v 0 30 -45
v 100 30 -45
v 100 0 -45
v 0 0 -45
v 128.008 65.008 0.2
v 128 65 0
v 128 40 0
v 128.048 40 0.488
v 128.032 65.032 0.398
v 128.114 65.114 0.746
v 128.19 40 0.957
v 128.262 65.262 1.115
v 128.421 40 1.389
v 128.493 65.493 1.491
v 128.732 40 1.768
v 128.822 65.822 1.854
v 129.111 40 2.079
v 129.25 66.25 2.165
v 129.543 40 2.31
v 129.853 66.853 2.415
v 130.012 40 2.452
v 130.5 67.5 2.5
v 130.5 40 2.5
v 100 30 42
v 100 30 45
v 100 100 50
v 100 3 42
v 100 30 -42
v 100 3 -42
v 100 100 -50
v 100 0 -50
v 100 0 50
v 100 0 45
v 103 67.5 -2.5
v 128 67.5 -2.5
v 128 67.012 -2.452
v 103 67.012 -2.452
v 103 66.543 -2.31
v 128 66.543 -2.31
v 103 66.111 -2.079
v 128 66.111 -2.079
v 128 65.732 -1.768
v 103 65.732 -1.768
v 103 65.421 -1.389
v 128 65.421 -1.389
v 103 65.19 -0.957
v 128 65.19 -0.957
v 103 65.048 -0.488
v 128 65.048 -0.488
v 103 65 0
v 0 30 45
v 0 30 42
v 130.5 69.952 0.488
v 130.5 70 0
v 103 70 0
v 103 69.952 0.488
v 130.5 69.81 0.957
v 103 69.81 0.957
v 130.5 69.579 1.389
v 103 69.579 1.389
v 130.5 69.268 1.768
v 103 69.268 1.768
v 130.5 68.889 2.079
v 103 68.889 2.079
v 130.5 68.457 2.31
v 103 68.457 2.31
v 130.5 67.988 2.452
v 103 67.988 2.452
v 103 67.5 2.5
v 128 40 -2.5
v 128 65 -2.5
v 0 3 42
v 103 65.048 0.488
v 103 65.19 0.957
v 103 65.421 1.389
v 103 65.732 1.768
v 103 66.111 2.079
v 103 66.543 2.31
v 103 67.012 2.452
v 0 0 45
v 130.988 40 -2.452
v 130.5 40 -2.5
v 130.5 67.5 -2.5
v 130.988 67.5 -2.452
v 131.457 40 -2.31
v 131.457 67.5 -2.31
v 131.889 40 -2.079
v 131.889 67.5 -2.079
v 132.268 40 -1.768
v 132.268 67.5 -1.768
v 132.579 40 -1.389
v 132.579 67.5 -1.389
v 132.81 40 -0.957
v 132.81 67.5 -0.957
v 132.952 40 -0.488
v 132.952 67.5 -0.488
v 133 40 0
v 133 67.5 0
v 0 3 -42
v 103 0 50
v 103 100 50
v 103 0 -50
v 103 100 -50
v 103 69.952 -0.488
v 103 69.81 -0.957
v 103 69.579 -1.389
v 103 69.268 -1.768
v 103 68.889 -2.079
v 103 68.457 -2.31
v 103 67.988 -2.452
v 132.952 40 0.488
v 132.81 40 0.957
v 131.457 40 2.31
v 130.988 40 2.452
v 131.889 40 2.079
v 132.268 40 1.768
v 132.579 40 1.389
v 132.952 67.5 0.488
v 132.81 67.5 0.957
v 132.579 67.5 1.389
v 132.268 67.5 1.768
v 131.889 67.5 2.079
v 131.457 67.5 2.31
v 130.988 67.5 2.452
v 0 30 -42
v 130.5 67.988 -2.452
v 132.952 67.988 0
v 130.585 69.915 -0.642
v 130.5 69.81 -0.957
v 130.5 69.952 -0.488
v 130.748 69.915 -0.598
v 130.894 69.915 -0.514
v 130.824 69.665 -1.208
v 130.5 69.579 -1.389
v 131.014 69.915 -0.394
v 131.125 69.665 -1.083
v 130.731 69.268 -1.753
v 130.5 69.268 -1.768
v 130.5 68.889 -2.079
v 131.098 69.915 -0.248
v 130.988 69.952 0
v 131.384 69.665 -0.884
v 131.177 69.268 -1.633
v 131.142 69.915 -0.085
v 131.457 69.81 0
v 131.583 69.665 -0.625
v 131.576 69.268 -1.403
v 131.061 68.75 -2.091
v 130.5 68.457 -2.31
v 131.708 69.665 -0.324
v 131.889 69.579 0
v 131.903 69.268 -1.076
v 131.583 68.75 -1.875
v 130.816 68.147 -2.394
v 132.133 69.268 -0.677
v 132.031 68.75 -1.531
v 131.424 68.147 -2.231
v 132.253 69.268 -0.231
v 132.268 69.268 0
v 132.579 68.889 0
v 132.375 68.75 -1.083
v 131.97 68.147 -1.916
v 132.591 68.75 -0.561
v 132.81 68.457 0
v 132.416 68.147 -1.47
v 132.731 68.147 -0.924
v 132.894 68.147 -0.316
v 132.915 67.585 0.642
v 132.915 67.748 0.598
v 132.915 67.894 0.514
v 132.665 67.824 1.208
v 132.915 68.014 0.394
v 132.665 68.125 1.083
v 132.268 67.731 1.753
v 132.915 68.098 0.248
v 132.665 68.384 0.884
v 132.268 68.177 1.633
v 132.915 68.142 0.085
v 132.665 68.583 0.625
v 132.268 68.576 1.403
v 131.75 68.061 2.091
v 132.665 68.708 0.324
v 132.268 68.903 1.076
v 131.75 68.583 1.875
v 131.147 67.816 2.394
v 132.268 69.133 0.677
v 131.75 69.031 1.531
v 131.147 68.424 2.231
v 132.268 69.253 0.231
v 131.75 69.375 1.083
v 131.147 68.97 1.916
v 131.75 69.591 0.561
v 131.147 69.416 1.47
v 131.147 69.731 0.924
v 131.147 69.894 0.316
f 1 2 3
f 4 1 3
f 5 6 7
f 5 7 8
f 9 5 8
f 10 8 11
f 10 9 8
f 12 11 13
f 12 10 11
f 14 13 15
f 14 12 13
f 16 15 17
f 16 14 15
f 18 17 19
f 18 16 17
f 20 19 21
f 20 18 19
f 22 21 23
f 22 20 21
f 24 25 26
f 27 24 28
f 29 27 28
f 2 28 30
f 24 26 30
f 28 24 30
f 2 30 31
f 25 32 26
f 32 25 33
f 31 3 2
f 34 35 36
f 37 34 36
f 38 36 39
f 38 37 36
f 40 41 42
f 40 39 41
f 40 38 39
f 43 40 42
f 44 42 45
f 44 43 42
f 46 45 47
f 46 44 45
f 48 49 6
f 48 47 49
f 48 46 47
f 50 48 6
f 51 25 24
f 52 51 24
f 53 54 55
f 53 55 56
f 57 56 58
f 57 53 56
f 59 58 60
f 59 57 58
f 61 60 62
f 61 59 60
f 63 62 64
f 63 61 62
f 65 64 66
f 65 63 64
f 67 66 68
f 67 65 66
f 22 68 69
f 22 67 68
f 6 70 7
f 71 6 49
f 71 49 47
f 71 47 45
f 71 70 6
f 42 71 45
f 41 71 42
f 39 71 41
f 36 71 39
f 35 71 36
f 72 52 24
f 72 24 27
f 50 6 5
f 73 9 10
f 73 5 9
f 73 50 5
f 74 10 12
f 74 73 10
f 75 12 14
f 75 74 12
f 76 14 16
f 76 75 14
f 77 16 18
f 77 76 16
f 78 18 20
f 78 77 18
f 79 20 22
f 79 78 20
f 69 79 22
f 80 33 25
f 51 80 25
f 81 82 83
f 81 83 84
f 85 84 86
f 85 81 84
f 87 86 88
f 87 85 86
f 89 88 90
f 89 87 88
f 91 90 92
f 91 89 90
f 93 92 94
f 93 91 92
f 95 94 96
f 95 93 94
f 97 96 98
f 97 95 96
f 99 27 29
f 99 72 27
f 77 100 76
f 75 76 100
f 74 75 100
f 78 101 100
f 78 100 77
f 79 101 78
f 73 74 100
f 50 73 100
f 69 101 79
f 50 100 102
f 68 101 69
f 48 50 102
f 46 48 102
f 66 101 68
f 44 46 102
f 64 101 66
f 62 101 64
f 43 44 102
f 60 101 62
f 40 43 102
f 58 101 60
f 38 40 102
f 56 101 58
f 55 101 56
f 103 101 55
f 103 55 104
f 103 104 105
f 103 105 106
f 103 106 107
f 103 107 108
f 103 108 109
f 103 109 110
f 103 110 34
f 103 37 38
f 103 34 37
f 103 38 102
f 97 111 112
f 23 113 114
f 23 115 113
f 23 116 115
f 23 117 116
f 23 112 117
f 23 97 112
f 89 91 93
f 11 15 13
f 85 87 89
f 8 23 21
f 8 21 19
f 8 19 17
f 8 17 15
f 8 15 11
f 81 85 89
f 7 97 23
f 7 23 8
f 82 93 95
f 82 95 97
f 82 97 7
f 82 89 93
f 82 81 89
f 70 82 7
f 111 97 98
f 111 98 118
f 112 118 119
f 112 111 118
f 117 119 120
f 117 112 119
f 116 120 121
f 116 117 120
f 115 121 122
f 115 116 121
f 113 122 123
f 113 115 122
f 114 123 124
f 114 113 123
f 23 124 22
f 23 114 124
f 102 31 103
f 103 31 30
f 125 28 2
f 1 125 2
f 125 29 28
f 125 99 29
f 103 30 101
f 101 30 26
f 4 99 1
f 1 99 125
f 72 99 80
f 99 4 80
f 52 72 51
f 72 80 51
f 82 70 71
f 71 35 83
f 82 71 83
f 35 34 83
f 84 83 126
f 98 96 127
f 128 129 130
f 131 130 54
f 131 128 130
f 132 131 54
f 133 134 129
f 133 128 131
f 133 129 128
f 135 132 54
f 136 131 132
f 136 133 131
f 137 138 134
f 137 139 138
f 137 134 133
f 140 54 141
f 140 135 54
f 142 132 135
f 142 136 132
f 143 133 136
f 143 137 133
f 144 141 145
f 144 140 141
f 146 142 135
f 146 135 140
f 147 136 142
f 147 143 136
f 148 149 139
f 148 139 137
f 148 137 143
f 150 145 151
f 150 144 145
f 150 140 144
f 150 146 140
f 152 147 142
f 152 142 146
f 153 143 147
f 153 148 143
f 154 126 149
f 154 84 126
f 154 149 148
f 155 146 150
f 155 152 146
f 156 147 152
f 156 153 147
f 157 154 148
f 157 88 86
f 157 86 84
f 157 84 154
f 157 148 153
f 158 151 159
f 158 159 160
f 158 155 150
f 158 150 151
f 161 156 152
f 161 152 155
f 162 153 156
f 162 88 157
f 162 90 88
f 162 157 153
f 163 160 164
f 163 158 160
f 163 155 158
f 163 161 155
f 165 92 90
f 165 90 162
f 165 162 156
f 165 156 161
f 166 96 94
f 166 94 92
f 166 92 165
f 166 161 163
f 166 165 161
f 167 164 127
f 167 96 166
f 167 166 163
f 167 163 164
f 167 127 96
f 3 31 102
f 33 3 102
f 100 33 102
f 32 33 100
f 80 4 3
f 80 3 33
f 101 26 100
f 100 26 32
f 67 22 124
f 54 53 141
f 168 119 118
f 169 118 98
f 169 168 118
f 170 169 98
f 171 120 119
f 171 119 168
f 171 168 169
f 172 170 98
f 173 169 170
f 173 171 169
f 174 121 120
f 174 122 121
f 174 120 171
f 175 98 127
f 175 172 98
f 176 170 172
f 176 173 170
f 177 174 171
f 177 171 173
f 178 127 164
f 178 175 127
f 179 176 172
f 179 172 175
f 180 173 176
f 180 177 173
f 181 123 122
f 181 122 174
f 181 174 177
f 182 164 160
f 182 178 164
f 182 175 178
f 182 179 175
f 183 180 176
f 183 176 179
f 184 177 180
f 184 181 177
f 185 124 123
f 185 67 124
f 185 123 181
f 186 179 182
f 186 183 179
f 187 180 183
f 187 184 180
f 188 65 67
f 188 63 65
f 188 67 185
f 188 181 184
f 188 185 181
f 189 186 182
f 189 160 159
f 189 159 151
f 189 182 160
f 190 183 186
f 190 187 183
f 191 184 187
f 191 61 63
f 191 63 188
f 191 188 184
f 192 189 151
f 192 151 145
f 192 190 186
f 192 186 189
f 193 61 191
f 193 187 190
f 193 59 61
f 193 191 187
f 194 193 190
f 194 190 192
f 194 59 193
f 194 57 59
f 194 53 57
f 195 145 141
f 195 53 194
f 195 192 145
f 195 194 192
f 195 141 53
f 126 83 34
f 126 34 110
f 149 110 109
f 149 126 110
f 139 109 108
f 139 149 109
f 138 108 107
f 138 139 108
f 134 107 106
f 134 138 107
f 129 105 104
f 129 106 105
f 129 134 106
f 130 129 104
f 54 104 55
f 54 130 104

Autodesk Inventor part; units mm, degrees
ref_plane "YZ Plane" through (0, 0, 0) normal (1, 0, 0) x (0, 1, 0)
ref_plane "XZ Plane" through (0, 0, 0) normal (0, 1, 0) x (-1, 0, 0)
ref_plane "XY Plane" through (0, 0, 0) normal (0, 0, 1) x (1, 0, 0)
sketch "Sketch1" plane through (0, 0, 0) normal (1, 0, 0) x (0, 1, 0)
  line L0 (0, 45) -> (30, 45)
  line L1 (30, 45) -> (30, -45)
  line L2 (30, -45) -> (0, -45)
  line L3 (0, -45) -> (0, 45)
  line L4 (30, 42) -> (3, 42)
  line L5 (3, 42) -> (3, -42)
  line L6 (3, -42) -> (30, -42)
  line L7 (30, -42) -> (30, 42)
  point P0 (0, 0)
  point P1 (30, -42)
  dimension "d0" = 45
  dimension "d1" = 90
  dimension "d2" = 30
  dimension "d3" = 0
  dimension "d4" = 3
  dimension "d5" = 3
  dimension "d6" = 3
extrude "Extrusion1" add sketch "Sketch1" along normal blind 100 contours L0 L1 L4 L5 L6 L2 L3
sketch "Sketch2" plane through (100, 0, 0) normal (1, 0, 0) x (0, 0, -1)
  line L0 (-50, 0) -> (50, 0)
  line L1 (50, 0) -> (50, 100)
  line L2 (50, 100) -> (-50, 100)
  line L3 (-50, 100) -> (-50, 0)
  line L4 (-45, 0) -> (45, 0) projected
  point P0 (0, 0)
  point P1 (0, 0)
  dimension "d9" = 100
  dimension "d10" = 100
extrude "Extrusion2" add sketch "Sketch2" along normal blind 3
sketch "Sketch4" plane through (0, 0, 0) normal (0, 0, 1) x (1, 0, 0)
  line L0 (103, 100) -> (103, 0) projected
  line L1 (103, 70) -> (133, 70)
  line L2 (133, 70) -> (133, 40)
  line L3 (133, 40) -> (128, 40)
  line L4 (128, 40) -> (128, 65)
  line L5 (128, 65) -> (103, 65)
  line L6 (100, 100) -> (103, 100) projected
  point P0 (0, 0)
  point P1 (115.5, 65)
  point P2 (118, 70)
  point P3 (128, 52.5)
  point P4 (101.5, 100)
  dimension "d13" = 5
  dimension "d14" = 5
  dimension "d15" = 30
  dimension "d16" = 30
  dimension "d17" = 30
extrude "Extrusion3" add sketch "Sketch4" along normal mid plane 5
fillet "Fillet1" radius 2.5 8 edges at (118, 70, 2.5) (115.5, 65, 2.5) (133, 55, 2.5) (128, 52.5, 2.5) (133, 55, -2.5) (133, 70, 0) (118, 70, -2.5) (115.5, 65, -2.5)
equation "\"d5\" = d4"
equation "\"d6\" = d4"
equation "\"d10\" = d9"
equation "\"d14\" = d13"
equation "\"d16\" = d15"
properties part number "RS2_AshBucket"
